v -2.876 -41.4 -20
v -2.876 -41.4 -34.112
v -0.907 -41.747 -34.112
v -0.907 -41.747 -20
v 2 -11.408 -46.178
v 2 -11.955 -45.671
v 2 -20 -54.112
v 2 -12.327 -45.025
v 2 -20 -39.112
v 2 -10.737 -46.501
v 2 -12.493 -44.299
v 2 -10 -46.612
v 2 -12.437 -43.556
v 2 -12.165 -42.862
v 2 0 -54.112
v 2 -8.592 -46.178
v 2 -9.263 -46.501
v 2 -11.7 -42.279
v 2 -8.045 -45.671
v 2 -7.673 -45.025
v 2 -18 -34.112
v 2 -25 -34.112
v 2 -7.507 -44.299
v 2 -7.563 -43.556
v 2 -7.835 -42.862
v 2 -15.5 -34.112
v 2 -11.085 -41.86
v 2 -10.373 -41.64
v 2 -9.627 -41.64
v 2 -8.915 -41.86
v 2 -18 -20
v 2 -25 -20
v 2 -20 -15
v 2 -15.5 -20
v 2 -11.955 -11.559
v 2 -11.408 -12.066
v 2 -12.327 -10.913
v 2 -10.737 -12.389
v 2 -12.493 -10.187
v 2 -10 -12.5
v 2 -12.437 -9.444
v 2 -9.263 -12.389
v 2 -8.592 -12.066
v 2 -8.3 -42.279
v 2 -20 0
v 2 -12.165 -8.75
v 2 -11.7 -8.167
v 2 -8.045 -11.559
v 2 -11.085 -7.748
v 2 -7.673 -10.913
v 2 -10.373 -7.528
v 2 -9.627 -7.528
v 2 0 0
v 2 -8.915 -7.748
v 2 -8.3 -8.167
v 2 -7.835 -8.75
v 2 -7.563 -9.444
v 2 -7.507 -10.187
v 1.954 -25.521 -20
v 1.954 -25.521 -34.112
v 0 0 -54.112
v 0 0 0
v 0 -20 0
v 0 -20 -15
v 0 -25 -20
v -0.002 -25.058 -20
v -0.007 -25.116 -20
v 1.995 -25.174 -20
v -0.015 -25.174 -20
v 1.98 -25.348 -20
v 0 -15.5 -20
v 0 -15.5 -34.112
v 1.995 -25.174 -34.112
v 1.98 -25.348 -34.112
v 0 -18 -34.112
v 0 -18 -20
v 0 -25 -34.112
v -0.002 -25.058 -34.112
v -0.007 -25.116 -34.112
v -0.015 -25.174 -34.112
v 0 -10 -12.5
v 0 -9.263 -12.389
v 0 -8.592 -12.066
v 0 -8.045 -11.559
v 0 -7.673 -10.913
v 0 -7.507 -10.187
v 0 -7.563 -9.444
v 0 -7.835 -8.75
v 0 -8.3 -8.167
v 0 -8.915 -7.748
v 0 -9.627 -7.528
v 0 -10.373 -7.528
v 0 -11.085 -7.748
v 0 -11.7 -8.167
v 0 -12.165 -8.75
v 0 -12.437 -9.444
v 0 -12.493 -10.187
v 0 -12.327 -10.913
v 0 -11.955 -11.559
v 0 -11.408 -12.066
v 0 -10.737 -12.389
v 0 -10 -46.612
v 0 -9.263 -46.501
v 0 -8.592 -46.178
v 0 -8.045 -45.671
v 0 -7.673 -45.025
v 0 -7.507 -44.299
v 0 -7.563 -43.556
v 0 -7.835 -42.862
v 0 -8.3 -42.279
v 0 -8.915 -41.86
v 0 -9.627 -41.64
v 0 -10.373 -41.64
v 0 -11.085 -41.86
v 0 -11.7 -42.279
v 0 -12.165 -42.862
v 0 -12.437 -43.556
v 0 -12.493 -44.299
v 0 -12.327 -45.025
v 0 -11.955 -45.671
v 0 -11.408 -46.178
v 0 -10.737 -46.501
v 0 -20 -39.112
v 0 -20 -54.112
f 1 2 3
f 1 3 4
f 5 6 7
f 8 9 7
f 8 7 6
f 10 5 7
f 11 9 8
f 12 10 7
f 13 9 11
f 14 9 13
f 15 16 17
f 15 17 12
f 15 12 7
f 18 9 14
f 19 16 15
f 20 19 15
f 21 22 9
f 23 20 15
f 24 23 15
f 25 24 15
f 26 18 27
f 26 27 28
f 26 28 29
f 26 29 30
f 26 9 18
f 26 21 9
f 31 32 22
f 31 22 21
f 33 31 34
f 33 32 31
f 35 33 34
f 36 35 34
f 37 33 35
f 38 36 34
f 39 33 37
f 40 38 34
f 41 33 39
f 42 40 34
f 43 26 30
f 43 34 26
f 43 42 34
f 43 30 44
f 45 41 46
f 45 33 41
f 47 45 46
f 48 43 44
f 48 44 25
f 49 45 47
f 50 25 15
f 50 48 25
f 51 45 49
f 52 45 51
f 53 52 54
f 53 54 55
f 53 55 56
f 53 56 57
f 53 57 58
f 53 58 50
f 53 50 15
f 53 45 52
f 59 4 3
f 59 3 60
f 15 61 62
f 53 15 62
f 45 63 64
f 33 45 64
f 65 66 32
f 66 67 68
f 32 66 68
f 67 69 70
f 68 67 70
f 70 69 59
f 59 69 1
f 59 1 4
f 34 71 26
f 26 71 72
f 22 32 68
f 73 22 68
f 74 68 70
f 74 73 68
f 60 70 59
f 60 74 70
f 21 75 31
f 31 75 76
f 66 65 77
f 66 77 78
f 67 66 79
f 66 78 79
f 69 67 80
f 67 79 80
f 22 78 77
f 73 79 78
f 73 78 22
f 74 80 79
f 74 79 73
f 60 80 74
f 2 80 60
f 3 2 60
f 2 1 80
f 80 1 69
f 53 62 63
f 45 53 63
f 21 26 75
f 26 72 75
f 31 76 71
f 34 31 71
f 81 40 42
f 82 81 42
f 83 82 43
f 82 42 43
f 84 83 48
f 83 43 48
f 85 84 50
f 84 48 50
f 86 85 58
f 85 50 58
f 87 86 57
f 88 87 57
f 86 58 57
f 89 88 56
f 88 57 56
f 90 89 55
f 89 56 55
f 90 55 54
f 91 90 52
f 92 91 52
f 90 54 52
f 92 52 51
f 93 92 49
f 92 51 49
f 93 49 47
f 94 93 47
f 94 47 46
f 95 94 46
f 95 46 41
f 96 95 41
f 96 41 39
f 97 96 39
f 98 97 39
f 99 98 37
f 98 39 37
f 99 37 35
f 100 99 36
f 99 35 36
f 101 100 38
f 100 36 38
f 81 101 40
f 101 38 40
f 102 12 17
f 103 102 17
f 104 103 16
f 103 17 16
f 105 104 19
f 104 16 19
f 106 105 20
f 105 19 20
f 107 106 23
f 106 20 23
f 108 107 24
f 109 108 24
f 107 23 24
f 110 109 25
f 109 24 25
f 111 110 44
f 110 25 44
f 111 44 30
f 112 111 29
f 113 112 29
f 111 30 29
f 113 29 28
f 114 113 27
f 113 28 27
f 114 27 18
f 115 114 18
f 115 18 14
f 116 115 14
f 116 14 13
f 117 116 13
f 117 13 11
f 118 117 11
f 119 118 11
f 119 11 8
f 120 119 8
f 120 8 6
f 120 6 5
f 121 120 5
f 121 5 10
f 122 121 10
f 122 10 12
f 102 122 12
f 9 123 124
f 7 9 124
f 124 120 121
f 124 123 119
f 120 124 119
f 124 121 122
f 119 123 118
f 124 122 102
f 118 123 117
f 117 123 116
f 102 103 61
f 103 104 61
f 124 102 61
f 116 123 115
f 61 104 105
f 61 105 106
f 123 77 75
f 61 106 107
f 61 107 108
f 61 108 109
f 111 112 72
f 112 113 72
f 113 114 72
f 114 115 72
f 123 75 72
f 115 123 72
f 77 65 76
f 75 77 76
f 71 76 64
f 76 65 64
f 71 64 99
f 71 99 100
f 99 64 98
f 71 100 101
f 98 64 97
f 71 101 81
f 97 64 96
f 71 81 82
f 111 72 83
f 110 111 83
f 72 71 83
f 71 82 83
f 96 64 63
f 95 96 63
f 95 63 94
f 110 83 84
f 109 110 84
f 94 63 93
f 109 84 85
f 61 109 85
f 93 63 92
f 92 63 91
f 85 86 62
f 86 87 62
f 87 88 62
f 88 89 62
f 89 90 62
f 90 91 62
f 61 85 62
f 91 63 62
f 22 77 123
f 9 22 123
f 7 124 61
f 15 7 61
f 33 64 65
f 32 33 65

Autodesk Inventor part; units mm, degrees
ref_plane "YZ Plane" through (0, 0, 0) normal (1, 0, 0) x (0, 1, 0)
ref_plane "XZ Plane" through (0, 0, 0) normal (0, 1, 0) x (-1, 0, 0)
ref_plane "XY Plane" through (0, 0, 0) normal (0, 0, 1) x (1, 0, 0)
sketch "Sketch1" plane through (0, 0, 0) normal (1, 0, 0) x (0, 1, 0)
  line L0 (0, 0) -> (-20, 0)
  line L1 (-20, 0) -> (-20, -54.112)
  line L2 (-20, -54.112) -> (0, -54.112)
  line L3 (0, -54.112) -> (0, 0)
  line L4 (-20, 0) -> (-20, -27.056)
  line L5 (-20, -27.056) -> (-20, -34.112)
  line L6 (-20, -34.112) -> (-42, -34.112)
  line L7 (-42, -34.112) -> (-42, -20)
  line L8 (-42, -20) -> (-20, -20)
  line L9 (-20, -20) -> (-20, -34.112)
  line L10 (-20, -20) -> (-18, -20)
  line L11 (-18, -20) -> (-15.5, -20)
  line L12 (-15.5, -20) -> (-15.5, -34.112)
  line L13 (-15.5, -34.112) -> (-18, -34.112)
  line L14 (-18, -34.112) -> (-18, -20)
  line L15 (-20, -20) -> (-20, -15)
  line L16 (-20, -15) -> (-25, -20)
  line L17 (-20, -34.112) -> (-25, -34.112)
  line L18 (-25, -34.112) -> (-20, -39.112)
  line L19 (-20, -34.112) -> (-20, -39.112)
  dimension "d0" = 20
  dimension "d1" = 54.112
  dimension "d2" = 27.056
  dimension "d3" = 7.056
  dimension "d4" = 22
  dimension "d5" = 14.112
  dimension "d6" = 2
  dimension "d7" = 2.5
  dimension "d8" = 5
  dimension "d9" = 45
  dimension "d10" = 5
extrude "Extrusion1" add sketch "Sketch1" along normal blind 2
sketch "Sketch2" plane through (2, 0, 0) normal (1, 0, 0) x (0, 0, -1)
  line L0 (20, -25) -> (20, -42) projected
  line L1 (34.112, -42) -> (34.112, -25) projected
  line L2 (20, -25) -> (34.112, -25)
  point P0 (0, 0)
bend part "Bend Part1" radius 3 angle 10 line through (2, -25, -20) along (0, 0, -1) centre toward (-1, 0, 0) moving side (0, -1, 0) both sides no
sketch "Sketch3" plane through (2, 0, 0) normal (1, 0, 0) x (0, 0, -1)
  line L0 (0, 0) -> (0, -20) projected
  line L1 (0, 0) -> (10, 0)
  line L2 (10, 0) -> (10, -10)
  line L3 (10, -10) -> (0, -10)
  line L4 (0, -10) -> (0, 0)
  line L5 (54.112, 0) -> (0, 0) projected
  line L6 (54.112, 0) -> (44.112, 0)
  line L7 (44.112, 0) -> (44.112, -10)
  line L8 (44.112, -10) -> (54.112, -10)
  line L9 (54.112, -10) -> (54.112, 0)
  circle A0 centre (10, -10) radius 2.5
  circle A1 centre (44.112, -10) radius 2.5
  dimension "d15" = 10
  dimension "d16" = 10
  dimension "d17" = 10
  dimension "d18" = 10
  dimension "d19" = 5
  dimension "d20" = 5
extrude "Extrusion2" cut sketch "Sketch3" against normal blind 2 contours A0 L2 L3 | L3 L2 A0 | A1 L8 L7 | L7 L8 A1
properties part number "manual_locker_upoper"
